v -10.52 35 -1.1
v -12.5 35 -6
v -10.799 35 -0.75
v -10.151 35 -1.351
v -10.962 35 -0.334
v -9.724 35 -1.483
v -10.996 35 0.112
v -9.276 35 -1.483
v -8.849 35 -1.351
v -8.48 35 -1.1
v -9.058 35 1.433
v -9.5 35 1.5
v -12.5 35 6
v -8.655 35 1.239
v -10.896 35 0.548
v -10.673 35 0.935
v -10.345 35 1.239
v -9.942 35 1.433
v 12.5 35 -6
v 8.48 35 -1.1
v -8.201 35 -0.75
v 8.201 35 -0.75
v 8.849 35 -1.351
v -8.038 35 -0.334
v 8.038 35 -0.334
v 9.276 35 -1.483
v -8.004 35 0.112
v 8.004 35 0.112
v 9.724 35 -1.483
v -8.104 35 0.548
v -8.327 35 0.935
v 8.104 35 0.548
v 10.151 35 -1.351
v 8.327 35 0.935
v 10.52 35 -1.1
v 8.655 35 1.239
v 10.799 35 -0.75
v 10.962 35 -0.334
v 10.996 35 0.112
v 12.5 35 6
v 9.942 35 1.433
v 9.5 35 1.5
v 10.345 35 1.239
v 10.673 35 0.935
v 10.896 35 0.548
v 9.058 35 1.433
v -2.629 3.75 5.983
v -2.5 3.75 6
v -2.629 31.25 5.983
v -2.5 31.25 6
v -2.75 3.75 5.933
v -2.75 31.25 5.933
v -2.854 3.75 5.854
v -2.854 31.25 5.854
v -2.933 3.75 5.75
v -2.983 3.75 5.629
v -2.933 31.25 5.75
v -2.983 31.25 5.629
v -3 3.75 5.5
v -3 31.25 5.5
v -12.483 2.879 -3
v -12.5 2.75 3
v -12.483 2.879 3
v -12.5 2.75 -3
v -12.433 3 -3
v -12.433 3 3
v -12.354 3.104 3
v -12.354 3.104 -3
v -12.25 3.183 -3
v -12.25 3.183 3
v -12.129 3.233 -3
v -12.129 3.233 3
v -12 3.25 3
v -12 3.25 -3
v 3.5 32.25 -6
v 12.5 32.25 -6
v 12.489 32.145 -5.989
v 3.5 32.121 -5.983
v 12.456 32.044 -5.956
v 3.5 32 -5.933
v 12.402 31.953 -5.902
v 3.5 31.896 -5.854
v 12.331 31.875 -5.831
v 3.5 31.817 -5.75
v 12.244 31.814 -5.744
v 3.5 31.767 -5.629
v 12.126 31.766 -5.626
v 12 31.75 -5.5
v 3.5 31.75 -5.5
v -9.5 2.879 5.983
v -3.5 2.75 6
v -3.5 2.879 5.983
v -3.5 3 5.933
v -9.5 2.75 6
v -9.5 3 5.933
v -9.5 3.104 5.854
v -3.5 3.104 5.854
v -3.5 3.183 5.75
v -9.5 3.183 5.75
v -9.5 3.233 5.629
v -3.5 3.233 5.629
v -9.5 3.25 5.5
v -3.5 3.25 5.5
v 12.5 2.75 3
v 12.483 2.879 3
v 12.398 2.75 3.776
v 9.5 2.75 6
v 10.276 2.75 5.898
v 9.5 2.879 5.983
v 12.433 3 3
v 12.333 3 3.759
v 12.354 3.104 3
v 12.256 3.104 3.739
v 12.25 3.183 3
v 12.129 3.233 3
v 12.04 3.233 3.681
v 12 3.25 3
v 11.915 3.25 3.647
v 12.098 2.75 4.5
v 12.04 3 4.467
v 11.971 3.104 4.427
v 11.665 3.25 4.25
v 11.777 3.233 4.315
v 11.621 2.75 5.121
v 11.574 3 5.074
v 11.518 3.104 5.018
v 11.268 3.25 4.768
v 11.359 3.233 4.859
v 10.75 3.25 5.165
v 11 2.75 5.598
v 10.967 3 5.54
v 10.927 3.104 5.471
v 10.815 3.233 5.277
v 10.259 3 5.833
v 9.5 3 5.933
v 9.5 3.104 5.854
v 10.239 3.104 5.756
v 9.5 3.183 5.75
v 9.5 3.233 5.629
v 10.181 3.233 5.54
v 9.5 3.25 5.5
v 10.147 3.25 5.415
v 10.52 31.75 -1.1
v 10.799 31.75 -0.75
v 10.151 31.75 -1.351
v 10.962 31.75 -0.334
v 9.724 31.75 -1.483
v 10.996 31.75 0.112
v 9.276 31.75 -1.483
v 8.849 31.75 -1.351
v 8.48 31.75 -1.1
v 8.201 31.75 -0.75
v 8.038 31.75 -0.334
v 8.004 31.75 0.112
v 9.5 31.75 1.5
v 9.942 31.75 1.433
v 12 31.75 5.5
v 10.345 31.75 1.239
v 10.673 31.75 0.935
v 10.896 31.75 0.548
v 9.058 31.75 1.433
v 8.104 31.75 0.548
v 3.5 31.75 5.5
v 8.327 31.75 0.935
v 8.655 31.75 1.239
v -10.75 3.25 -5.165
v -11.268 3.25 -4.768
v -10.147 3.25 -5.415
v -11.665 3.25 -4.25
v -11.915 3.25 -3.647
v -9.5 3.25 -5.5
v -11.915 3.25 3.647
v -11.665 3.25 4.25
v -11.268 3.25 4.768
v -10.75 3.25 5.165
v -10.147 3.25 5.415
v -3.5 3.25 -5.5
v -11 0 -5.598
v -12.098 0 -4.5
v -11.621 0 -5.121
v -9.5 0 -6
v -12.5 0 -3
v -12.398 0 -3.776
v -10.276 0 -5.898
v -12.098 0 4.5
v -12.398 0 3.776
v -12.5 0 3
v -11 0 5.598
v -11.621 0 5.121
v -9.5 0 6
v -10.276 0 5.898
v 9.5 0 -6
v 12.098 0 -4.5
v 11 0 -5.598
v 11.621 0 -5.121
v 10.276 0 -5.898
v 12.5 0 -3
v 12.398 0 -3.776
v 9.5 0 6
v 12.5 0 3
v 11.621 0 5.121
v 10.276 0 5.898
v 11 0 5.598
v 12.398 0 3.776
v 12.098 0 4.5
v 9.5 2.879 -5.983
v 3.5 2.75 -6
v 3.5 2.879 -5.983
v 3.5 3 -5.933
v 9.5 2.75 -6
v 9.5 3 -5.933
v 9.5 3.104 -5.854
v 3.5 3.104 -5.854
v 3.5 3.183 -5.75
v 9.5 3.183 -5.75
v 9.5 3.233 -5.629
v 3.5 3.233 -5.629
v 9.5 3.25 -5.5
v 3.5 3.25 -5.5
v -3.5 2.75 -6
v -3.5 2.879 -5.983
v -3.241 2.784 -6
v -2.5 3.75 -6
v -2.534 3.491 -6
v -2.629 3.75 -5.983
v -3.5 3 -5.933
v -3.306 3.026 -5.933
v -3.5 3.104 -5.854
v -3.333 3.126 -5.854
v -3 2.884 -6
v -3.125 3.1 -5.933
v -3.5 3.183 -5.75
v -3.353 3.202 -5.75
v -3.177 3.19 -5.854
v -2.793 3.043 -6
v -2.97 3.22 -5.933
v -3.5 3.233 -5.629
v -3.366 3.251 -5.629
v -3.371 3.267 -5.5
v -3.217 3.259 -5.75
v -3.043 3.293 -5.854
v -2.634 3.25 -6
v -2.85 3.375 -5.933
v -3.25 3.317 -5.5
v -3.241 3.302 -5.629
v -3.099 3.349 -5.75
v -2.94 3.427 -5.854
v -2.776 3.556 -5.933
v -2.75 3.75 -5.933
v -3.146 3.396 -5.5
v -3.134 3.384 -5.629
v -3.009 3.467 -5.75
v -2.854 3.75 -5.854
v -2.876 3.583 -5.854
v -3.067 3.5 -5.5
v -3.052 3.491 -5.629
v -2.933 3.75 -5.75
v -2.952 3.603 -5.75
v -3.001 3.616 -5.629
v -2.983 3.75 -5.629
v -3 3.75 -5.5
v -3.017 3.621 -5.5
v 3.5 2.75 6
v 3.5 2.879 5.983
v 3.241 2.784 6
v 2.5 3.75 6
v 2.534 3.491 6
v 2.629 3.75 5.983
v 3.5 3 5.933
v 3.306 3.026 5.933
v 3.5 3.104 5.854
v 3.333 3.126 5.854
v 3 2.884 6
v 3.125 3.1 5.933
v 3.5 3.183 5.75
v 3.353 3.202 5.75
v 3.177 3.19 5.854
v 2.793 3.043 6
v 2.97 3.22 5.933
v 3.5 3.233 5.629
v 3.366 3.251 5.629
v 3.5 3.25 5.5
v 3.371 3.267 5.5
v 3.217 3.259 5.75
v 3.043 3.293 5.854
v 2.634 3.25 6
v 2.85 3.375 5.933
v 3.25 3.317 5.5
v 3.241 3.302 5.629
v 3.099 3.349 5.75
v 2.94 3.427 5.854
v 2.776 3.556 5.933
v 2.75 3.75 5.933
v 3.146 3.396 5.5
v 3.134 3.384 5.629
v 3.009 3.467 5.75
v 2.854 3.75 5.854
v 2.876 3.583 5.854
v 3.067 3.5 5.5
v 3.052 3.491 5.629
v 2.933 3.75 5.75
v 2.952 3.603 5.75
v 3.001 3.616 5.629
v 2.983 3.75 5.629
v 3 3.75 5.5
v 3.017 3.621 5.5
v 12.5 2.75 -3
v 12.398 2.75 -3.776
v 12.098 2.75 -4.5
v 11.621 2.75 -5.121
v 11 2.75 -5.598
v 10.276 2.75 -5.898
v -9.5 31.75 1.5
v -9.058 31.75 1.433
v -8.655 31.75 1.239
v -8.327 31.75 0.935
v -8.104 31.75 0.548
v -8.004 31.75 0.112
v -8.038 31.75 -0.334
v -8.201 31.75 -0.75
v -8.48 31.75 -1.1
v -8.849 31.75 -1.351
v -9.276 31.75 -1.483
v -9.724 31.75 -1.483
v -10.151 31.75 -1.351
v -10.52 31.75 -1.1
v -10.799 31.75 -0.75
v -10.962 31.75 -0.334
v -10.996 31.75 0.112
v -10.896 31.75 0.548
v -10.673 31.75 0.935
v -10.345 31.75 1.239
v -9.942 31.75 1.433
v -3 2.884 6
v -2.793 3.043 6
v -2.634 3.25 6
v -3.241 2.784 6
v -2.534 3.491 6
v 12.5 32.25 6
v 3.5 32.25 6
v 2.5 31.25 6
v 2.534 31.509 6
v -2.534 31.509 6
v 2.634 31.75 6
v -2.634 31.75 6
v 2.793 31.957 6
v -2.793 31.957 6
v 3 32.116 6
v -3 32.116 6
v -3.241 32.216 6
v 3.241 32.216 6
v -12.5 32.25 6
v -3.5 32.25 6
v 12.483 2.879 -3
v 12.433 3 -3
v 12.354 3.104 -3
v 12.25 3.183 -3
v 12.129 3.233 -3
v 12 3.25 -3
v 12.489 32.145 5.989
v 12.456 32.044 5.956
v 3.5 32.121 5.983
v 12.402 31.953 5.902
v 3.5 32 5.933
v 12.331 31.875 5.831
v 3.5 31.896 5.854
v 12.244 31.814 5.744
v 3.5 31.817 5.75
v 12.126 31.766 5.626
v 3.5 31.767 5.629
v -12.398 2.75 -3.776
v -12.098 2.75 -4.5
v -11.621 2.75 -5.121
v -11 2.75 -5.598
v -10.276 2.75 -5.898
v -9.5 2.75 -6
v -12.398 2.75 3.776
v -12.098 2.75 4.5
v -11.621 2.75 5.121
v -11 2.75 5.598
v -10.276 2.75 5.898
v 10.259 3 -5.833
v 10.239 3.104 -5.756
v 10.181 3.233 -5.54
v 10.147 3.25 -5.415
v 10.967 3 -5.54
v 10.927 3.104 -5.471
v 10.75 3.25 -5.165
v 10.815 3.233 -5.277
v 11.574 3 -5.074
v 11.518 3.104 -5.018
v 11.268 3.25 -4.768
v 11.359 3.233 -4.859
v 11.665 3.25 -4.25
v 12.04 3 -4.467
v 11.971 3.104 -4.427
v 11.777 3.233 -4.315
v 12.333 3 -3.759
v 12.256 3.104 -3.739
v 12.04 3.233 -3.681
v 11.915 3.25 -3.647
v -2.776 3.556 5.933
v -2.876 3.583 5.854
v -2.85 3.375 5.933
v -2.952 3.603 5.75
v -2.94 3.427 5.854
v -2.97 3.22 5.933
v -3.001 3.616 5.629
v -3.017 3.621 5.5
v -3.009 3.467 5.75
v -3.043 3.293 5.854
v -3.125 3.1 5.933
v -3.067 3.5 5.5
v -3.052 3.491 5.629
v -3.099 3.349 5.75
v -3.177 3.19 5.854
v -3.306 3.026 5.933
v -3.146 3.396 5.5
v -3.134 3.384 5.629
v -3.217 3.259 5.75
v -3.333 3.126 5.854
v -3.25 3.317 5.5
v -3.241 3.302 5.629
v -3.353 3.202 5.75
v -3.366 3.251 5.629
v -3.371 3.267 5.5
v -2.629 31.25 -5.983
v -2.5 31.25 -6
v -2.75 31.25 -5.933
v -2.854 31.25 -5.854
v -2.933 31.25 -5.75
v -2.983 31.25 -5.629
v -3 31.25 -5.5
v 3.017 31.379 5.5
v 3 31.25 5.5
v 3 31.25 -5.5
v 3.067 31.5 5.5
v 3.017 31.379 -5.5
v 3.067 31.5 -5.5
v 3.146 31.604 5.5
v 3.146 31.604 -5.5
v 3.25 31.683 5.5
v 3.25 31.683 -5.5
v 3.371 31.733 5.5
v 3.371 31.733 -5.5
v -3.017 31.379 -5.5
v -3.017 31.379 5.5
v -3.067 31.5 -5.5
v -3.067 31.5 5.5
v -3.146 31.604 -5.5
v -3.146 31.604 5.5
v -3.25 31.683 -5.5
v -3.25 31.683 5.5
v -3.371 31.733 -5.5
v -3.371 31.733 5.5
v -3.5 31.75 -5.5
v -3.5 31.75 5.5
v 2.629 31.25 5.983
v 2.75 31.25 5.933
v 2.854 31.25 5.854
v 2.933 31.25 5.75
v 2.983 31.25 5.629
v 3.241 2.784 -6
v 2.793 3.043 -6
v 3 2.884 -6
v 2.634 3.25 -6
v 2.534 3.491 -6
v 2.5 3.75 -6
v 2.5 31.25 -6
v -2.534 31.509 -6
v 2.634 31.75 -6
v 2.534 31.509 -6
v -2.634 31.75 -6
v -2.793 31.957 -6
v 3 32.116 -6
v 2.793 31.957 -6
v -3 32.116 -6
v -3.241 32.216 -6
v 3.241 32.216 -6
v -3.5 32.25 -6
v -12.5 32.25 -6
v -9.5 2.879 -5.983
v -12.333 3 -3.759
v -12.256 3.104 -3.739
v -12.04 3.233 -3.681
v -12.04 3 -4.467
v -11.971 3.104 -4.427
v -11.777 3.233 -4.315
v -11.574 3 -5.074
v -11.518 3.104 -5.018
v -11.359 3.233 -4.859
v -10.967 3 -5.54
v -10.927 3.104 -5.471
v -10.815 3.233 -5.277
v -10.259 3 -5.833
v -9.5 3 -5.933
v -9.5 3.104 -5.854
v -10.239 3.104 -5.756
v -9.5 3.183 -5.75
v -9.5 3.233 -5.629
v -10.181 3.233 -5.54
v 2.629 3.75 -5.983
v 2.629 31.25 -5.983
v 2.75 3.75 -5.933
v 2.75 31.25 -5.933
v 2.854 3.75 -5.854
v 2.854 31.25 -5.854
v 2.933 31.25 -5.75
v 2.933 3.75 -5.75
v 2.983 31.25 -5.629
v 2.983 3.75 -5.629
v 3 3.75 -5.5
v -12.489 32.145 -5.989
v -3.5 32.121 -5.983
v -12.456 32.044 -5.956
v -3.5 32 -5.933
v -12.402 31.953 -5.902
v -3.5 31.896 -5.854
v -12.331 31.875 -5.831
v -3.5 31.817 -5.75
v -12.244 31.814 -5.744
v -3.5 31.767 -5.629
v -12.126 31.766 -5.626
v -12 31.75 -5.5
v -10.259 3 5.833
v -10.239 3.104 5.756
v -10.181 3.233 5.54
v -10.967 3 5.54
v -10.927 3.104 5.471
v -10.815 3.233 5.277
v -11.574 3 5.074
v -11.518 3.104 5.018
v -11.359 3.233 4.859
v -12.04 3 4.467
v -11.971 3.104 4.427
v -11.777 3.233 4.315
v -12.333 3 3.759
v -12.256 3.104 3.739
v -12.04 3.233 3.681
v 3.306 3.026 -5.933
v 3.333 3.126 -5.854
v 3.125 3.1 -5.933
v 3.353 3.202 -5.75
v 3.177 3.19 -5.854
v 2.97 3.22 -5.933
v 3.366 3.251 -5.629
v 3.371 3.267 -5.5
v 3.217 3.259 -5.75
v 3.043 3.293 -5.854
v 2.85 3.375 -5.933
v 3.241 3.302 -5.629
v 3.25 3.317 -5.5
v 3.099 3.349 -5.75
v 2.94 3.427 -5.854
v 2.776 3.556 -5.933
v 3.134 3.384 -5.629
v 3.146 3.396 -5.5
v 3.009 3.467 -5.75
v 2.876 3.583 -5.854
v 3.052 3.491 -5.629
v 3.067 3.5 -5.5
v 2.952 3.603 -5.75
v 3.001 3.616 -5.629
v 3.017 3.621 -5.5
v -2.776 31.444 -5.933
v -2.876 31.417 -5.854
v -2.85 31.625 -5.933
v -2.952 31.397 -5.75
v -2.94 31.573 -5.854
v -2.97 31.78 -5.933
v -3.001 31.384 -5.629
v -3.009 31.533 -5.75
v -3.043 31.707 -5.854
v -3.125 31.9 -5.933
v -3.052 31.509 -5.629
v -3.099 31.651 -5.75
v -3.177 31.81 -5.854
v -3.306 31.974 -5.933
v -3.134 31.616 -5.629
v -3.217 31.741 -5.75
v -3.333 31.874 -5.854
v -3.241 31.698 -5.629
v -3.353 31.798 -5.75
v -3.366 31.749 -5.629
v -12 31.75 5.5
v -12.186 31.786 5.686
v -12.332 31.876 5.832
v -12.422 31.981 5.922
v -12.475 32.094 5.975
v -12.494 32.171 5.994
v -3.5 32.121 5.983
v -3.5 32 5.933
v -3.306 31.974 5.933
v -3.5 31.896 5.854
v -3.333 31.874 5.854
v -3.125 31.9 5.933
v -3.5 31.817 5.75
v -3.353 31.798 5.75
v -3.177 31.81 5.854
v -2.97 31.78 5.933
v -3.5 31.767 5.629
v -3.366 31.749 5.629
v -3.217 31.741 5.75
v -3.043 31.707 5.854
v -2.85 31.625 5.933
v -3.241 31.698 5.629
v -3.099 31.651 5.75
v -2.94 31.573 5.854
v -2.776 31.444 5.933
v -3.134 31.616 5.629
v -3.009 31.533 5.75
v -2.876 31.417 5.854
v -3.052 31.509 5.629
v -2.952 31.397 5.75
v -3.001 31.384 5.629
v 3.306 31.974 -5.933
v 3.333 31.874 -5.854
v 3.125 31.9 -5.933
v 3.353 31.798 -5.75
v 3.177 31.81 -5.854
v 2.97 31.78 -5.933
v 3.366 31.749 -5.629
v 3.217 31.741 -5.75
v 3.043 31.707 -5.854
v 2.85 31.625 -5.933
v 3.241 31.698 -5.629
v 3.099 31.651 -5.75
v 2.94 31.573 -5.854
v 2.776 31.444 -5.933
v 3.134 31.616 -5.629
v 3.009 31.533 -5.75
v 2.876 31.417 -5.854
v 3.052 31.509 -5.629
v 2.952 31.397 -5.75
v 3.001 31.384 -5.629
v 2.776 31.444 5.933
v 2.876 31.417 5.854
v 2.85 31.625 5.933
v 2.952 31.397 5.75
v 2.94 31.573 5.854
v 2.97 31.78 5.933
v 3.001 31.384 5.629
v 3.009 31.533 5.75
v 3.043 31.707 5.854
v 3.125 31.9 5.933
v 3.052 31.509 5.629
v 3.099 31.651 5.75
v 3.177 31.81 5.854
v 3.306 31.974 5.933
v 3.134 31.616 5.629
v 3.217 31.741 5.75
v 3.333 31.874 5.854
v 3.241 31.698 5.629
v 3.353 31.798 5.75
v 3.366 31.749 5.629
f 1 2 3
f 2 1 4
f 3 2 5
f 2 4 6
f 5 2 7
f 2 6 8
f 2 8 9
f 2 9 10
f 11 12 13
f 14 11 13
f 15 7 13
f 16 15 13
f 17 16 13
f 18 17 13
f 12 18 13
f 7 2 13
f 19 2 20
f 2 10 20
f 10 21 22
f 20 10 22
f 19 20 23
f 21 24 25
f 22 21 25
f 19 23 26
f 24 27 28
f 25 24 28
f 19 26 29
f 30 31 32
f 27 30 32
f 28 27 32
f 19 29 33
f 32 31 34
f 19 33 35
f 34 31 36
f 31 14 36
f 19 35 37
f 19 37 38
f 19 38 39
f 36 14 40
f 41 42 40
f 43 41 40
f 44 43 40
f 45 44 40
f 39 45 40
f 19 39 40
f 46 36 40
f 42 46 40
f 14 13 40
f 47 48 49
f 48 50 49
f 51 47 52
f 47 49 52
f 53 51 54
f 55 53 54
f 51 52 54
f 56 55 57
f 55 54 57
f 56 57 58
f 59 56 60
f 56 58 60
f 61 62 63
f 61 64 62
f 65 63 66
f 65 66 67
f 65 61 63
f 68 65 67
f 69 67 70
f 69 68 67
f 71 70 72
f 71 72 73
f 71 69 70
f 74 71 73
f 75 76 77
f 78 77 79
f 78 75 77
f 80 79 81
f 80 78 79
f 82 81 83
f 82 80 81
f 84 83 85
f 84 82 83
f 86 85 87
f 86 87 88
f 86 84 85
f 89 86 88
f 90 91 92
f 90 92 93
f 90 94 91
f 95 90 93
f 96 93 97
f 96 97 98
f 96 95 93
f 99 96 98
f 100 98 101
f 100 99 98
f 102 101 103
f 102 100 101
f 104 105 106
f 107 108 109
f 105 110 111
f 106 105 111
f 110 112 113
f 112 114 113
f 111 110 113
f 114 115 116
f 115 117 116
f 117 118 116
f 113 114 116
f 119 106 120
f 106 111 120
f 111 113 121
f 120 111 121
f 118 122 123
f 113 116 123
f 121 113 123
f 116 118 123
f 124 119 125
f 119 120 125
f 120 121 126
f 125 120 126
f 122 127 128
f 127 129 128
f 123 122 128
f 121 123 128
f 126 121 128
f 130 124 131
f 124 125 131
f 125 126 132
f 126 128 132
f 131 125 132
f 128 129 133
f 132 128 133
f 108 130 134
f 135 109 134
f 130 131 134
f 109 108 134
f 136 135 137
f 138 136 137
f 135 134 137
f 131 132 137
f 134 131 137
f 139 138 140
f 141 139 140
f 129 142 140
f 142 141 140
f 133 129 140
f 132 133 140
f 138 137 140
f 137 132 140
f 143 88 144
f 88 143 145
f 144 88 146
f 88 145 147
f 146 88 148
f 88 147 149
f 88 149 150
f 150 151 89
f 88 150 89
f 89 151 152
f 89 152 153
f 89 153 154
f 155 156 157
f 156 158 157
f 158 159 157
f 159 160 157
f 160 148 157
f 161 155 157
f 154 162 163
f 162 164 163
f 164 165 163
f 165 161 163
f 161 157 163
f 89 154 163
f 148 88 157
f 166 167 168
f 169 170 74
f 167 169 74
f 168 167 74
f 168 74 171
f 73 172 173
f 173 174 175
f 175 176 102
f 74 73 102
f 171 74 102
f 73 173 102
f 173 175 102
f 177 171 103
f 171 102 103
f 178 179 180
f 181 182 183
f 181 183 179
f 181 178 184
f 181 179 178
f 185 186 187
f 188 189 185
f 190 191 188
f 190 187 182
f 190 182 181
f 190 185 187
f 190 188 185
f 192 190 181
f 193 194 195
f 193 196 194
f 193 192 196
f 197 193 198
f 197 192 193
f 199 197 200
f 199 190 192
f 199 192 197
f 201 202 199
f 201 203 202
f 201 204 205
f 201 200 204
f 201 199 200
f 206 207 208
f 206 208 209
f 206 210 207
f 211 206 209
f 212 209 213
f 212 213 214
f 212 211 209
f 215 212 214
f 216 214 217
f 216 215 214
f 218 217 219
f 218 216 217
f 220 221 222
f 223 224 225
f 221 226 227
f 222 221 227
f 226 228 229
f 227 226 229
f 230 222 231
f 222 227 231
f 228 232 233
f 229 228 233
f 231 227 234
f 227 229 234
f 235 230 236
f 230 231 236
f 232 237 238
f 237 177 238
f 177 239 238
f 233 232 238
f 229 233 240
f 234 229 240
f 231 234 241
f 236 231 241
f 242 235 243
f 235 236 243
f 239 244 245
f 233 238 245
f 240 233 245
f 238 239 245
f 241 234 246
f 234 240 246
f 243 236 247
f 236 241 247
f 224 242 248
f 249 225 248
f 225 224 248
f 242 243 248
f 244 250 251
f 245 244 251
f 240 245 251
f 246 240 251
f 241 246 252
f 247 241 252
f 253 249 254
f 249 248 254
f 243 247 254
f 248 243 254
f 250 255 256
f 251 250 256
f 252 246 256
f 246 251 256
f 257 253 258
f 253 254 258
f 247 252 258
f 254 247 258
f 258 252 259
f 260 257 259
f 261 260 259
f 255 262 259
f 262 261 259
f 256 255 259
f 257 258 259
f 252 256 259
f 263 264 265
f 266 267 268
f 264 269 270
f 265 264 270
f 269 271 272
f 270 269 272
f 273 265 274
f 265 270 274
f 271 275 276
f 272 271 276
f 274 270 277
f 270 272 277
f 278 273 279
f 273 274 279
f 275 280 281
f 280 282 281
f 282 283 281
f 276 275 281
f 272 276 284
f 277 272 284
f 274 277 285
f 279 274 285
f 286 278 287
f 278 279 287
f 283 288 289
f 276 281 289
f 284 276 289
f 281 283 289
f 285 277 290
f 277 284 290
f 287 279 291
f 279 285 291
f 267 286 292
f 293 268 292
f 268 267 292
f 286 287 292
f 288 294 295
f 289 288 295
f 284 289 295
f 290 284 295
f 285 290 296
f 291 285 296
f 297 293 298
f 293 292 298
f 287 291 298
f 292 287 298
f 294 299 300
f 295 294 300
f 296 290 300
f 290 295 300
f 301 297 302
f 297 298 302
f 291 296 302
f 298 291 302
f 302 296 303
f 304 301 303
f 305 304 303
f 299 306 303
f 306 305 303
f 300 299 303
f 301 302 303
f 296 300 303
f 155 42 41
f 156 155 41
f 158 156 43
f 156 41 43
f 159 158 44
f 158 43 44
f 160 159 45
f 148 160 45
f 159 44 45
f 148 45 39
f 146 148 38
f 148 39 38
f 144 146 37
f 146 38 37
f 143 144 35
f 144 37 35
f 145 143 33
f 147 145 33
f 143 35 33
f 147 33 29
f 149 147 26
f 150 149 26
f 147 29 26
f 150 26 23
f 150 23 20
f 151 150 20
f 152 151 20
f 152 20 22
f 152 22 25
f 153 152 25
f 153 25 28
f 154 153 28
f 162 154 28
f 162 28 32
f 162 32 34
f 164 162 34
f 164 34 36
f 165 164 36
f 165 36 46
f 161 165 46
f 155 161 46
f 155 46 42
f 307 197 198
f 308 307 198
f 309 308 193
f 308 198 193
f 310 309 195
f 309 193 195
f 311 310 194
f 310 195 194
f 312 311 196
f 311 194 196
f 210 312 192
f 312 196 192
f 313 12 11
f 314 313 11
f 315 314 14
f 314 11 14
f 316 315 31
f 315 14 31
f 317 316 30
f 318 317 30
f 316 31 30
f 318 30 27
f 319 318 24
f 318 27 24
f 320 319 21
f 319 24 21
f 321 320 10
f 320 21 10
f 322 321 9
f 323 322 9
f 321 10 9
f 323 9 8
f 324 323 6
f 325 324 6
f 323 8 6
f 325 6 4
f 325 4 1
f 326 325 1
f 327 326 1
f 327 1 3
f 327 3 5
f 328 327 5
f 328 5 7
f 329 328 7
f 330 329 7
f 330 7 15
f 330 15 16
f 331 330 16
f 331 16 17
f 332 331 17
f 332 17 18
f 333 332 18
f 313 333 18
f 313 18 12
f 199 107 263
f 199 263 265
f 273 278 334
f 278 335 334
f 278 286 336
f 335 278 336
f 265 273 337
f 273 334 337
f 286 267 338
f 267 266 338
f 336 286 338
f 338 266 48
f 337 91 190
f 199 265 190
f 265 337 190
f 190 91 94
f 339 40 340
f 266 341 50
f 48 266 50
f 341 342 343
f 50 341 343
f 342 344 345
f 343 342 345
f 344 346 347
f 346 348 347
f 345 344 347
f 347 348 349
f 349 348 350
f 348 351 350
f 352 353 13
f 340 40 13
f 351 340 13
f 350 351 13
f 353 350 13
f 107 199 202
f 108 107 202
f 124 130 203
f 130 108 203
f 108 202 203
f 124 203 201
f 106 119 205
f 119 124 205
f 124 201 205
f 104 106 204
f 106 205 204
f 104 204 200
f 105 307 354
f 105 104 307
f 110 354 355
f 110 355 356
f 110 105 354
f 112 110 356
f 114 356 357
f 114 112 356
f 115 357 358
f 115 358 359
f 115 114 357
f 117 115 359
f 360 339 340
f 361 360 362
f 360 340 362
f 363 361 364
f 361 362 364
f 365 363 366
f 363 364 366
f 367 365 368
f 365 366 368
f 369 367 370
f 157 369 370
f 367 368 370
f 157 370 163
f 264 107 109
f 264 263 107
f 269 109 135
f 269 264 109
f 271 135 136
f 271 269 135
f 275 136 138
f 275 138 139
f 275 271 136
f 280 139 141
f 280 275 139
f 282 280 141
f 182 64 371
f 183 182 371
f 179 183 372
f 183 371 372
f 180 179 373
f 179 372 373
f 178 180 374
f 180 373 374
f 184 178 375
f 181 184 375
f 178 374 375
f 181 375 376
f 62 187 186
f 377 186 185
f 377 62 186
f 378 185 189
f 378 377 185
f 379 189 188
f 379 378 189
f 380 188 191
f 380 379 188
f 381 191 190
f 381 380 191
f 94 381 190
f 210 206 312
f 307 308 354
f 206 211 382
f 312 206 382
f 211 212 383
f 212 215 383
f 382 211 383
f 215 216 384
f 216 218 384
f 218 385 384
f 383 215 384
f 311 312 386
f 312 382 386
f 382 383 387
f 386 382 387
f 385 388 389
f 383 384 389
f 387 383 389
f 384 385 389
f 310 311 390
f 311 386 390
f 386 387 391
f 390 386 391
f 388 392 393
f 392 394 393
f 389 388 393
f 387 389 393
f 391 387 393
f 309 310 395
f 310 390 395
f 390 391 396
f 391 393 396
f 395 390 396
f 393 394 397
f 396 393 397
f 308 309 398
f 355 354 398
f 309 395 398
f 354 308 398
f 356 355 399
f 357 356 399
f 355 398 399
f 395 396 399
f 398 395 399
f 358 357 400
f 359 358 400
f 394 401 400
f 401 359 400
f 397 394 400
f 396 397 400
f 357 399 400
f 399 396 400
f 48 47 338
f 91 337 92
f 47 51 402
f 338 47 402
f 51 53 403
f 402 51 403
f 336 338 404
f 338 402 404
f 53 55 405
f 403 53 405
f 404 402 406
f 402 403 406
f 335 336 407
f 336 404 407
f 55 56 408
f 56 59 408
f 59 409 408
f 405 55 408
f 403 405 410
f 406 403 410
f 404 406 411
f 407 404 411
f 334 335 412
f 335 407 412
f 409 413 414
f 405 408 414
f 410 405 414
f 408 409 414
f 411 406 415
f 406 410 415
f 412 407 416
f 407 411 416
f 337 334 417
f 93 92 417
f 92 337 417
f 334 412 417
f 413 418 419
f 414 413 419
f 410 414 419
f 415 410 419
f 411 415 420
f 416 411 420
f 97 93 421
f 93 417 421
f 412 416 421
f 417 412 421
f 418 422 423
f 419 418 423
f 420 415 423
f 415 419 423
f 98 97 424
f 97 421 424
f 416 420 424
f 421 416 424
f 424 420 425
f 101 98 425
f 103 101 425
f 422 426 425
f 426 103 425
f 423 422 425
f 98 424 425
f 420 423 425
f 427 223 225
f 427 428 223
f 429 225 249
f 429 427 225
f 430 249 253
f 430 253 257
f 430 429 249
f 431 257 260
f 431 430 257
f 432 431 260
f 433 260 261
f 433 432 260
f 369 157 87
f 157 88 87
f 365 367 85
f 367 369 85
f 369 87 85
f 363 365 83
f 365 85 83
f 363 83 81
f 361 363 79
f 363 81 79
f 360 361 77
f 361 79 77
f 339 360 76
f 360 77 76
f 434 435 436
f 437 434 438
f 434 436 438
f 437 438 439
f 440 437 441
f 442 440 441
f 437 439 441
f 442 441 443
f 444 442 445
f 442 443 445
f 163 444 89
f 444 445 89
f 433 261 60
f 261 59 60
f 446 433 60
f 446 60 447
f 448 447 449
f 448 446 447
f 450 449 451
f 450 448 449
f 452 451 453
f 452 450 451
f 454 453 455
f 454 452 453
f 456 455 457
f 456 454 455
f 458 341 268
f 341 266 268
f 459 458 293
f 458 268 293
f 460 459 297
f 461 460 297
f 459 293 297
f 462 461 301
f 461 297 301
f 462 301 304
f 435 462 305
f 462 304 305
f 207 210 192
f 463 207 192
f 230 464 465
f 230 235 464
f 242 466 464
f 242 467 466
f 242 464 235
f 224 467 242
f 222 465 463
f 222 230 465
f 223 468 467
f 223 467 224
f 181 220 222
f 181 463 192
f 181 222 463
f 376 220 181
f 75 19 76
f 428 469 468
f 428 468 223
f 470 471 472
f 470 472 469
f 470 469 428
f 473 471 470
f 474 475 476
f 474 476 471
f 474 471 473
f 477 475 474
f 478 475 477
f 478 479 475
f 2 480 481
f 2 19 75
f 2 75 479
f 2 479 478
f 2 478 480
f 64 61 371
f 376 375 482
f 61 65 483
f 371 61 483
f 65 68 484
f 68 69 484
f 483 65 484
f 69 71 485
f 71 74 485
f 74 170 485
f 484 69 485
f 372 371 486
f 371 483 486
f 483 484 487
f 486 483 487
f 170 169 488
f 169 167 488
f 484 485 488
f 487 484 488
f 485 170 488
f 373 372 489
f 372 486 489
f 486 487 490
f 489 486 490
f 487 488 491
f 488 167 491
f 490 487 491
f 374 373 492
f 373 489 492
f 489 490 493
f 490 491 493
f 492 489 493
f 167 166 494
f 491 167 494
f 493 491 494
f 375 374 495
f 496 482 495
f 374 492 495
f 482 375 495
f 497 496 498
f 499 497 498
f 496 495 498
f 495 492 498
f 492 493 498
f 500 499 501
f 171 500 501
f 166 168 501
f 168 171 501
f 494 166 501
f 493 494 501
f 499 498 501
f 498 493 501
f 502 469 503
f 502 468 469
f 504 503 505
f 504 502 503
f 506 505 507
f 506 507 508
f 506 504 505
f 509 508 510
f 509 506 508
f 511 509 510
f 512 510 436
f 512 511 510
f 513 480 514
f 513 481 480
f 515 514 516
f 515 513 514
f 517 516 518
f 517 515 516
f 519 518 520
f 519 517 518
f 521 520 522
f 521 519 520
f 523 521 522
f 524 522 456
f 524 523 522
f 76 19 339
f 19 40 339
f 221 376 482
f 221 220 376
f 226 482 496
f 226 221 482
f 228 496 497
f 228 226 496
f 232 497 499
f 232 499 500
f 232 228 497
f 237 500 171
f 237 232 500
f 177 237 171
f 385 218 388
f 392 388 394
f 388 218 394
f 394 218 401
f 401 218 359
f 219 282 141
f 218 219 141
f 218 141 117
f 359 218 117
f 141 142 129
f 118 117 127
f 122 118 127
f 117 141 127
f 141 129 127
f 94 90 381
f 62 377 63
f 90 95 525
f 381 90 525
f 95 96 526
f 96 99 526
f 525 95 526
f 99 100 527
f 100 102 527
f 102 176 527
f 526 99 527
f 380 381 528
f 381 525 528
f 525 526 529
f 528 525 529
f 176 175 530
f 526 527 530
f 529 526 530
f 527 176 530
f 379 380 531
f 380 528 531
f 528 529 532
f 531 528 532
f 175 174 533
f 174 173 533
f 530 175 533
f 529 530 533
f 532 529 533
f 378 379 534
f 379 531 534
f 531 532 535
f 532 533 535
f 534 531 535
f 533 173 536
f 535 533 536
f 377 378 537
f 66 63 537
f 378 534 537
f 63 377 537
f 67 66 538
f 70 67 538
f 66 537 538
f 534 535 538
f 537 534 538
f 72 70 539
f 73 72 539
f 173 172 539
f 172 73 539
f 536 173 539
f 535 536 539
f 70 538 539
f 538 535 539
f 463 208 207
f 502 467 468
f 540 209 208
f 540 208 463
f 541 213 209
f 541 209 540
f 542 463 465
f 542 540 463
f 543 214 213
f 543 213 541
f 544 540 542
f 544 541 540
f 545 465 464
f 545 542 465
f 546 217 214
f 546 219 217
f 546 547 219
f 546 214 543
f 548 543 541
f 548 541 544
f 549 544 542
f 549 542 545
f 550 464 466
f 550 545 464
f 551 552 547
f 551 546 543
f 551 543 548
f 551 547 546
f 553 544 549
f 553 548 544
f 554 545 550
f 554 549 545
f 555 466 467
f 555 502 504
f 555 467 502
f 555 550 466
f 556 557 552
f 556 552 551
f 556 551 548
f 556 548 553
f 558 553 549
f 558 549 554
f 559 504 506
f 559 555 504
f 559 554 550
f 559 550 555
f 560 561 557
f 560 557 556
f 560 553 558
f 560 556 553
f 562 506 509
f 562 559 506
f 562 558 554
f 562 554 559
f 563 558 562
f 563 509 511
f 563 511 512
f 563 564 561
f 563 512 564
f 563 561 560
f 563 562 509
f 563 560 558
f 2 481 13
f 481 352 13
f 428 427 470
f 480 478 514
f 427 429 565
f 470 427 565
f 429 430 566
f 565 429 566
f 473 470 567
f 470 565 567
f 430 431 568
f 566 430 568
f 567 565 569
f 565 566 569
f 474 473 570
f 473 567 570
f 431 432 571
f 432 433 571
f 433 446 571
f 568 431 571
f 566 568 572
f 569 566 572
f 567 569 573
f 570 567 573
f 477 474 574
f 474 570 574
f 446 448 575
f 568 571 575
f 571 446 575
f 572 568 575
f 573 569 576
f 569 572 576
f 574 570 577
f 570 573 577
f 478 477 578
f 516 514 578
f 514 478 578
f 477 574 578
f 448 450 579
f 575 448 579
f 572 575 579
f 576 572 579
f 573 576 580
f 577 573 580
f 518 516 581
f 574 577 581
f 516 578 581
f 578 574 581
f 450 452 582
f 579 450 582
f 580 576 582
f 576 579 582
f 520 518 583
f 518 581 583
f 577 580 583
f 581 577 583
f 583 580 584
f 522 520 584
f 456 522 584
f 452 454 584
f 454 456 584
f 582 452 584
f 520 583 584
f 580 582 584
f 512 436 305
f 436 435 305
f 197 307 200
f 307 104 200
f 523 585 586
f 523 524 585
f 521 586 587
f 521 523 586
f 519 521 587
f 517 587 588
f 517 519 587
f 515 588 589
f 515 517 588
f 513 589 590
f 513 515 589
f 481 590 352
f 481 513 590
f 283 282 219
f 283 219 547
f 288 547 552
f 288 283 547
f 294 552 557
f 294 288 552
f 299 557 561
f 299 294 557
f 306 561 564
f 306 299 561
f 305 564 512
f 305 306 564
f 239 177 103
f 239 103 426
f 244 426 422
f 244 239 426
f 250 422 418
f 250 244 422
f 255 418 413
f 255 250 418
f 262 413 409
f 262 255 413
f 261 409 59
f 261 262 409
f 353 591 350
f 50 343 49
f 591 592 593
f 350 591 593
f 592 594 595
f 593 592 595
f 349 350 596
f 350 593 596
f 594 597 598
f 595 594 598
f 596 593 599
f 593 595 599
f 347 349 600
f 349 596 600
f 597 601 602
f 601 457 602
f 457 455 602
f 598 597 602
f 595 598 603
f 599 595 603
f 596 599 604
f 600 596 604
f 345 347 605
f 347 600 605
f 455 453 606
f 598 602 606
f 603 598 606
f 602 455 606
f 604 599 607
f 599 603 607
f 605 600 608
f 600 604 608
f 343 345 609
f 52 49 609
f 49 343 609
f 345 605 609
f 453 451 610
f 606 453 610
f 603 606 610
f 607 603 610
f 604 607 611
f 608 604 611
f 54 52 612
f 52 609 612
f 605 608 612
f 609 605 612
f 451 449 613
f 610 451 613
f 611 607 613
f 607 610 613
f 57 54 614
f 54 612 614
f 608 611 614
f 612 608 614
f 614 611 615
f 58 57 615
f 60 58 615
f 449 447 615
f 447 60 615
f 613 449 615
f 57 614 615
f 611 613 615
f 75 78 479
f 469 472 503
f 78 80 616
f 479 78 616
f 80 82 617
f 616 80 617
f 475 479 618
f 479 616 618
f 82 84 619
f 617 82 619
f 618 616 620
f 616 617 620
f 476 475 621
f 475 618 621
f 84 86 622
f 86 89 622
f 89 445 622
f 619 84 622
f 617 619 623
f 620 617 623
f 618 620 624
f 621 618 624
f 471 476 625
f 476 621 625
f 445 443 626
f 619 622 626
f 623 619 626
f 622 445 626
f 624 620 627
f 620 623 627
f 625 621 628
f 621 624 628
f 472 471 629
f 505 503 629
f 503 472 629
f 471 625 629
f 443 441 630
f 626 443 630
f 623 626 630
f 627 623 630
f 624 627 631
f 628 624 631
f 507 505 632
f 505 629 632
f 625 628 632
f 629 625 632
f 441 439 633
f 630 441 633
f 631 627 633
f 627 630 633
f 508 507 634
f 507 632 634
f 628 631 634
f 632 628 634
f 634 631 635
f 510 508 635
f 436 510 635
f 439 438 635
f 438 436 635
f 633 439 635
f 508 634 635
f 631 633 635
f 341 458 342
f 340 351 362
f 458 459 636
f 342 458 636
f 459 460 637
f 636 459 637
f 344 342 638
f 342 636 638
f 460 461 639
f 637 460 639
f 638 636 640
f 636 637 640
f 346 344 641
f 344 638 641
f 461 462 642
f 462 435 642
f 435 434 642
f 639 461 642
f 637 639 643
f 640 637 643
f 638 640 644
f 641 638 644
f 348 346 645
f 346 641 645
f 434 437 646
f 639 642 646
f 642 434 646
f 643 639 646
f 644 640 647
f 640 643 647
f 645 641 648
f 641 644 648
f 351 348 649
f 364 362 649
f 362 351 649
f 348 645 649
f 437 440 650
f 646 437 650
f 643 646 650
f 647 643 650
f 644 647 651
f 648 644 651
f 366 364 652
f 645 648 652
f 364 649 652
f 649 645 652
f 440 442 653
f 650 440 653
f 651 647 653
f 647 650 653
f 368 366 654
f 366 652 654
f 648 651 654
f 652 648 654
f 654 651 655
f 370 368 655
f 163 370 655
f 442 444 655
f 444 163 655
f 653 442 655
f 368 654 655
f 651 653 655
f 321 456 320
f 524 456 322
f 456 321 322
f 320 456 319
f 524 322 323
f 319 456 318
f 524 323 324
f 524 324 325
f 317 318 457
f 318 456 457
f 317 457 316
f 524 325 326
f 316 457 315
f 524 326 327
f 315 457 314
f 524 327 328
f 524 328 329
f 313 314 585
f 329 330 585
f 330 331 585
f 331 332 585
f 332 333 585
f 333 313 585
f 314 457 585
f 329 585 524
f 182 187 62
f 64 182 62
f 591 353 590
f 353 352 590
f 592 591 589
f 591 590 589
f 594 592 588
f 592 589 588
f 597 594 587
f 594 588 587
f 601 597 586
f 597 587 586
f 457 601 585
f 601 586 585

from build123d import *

# Parameters (mm, degrees)
BOSS_EXTRUDE1_DEPTH = 6
FILLET1_R           = 3
CUT_EXTRUDE1_REACH  = 39.646
SKETCH2_R           = 1.5
FILLET2_R           = 0.5


with BuildPart() as part:
    # Sketch1 → Boss-Extrude1 (new, symmetric)
    with BuildSketch(Plane.XY):
        Polygon((0, 0), (-12.5, 0), (-12.5, 3.25), (-3, 3.25), (-3, 31.75), (-12.5, 31.75), (-12.5, 35), (12.5, 35), (12.5, 31.75), (3, 31.75), (3, 3.25), (12.5, 3.25), (12.5, 0), align=None)
    extrude(amount=BOSS_EXTRUDE1_DEPTH, both=True)

    # Fillet1
    fillet1_edges = [part.edges().sort_by_distance(p)[0] for p in [
        (-12.5, 1.625, -6),
        (12.5, 1.625, -6),
        (-12.5, 1.625, 6),
        (12.5, 1.625, 6),
    ]]
    fillet(fillet1_edges, radius=FILLET1_R)

    # Sketch2 → Cut-Extrude1 (cut, up to next)
    with BuildSketch(Plane(origin=(0, 35, 0), x_dir=(1, 0, 0), z_dir=(0, 1, 0)), mode=Mode.PRIVATE) as cut_extrude1_sk1:
        with Locations(Location((-9.5, 0, 0), (0, 0, 270))):
            Circle(SKETCH2_R)
    cut_extrude1_tool1 = extrude(cut_extrude1_sk1.sketch, amount=-CUT_EXTRUDE1_REACH, mode=Mode.PRIVATE) & part.part
    # Sketch2 → Cut-Extrude1 (cut, up to next)
    with BuildSketch(Plane(origin=(0, 35, 0), x_dir=(1, 0, 0), z_dir=(0, 1, 0)), mode=Mode.PRIVATE) as cut_extrude1_sk2:
        with Locations(Location((9.5, 0, 0), (0, 0, 270))):
            Circle(SKETCH2_R)
    cut_extrude1_tool2 = extrude(cut_extrude1_sk2.sketch, amount=-CUT_EXTRUDE1_REACH, mode=Mode.PRIVATE) & part.part
    add(cut_extrude1_tool1.solids().sort_by_distance((-9.5, 35, 0))[0], mode=Mode.SUBTRACT)
    add(cut_extrude1_tool2.solids().sort_by_distance((9.5, 35, 0))[0], mode=Mode.SUBTRACT)

    # Fillet2
    fillet2_edges = [part.edges().sort_by_distance(p)[0] for p in [
        (-6.25, 3.25, -6),
        (-3, 17.5, -6),
        (-7.75, 31.75, -6),
        (7.75, 31.75, -6),
        (3, 17.5, -6),
        (3, 17.5, 6),
        (7.75, 31.75, 6),
        (-3, 3.25, 0),
        (-3, 31.75, 0),
        (-12.5, 31.75, 0),
        (12.5, 31.75, 0),
        (3, 31.75, 0),
        (3, 3.25, 0),
        (-7.75, 31.75, 6),
        (-12.5, 3.25, 0),
        (-3, 17.5, 6),
        (-6.25, 3.25, 6),
        (6.25, 3.25, -6),
        (-11.621320344, 3.25, 5.121320344),
        (-11.621320344, 3.25, -5.121320344),
        (12.5, 3.25, 0),
        (6.25, 3.25, 6),
        (11.621320344, 3.25, 5.121320344),
        (11.621320344, 3.25, -5.121320344),
    ]]
    fillet(fillet2_edges, radius=FILLET2_R)


solid = part.part
